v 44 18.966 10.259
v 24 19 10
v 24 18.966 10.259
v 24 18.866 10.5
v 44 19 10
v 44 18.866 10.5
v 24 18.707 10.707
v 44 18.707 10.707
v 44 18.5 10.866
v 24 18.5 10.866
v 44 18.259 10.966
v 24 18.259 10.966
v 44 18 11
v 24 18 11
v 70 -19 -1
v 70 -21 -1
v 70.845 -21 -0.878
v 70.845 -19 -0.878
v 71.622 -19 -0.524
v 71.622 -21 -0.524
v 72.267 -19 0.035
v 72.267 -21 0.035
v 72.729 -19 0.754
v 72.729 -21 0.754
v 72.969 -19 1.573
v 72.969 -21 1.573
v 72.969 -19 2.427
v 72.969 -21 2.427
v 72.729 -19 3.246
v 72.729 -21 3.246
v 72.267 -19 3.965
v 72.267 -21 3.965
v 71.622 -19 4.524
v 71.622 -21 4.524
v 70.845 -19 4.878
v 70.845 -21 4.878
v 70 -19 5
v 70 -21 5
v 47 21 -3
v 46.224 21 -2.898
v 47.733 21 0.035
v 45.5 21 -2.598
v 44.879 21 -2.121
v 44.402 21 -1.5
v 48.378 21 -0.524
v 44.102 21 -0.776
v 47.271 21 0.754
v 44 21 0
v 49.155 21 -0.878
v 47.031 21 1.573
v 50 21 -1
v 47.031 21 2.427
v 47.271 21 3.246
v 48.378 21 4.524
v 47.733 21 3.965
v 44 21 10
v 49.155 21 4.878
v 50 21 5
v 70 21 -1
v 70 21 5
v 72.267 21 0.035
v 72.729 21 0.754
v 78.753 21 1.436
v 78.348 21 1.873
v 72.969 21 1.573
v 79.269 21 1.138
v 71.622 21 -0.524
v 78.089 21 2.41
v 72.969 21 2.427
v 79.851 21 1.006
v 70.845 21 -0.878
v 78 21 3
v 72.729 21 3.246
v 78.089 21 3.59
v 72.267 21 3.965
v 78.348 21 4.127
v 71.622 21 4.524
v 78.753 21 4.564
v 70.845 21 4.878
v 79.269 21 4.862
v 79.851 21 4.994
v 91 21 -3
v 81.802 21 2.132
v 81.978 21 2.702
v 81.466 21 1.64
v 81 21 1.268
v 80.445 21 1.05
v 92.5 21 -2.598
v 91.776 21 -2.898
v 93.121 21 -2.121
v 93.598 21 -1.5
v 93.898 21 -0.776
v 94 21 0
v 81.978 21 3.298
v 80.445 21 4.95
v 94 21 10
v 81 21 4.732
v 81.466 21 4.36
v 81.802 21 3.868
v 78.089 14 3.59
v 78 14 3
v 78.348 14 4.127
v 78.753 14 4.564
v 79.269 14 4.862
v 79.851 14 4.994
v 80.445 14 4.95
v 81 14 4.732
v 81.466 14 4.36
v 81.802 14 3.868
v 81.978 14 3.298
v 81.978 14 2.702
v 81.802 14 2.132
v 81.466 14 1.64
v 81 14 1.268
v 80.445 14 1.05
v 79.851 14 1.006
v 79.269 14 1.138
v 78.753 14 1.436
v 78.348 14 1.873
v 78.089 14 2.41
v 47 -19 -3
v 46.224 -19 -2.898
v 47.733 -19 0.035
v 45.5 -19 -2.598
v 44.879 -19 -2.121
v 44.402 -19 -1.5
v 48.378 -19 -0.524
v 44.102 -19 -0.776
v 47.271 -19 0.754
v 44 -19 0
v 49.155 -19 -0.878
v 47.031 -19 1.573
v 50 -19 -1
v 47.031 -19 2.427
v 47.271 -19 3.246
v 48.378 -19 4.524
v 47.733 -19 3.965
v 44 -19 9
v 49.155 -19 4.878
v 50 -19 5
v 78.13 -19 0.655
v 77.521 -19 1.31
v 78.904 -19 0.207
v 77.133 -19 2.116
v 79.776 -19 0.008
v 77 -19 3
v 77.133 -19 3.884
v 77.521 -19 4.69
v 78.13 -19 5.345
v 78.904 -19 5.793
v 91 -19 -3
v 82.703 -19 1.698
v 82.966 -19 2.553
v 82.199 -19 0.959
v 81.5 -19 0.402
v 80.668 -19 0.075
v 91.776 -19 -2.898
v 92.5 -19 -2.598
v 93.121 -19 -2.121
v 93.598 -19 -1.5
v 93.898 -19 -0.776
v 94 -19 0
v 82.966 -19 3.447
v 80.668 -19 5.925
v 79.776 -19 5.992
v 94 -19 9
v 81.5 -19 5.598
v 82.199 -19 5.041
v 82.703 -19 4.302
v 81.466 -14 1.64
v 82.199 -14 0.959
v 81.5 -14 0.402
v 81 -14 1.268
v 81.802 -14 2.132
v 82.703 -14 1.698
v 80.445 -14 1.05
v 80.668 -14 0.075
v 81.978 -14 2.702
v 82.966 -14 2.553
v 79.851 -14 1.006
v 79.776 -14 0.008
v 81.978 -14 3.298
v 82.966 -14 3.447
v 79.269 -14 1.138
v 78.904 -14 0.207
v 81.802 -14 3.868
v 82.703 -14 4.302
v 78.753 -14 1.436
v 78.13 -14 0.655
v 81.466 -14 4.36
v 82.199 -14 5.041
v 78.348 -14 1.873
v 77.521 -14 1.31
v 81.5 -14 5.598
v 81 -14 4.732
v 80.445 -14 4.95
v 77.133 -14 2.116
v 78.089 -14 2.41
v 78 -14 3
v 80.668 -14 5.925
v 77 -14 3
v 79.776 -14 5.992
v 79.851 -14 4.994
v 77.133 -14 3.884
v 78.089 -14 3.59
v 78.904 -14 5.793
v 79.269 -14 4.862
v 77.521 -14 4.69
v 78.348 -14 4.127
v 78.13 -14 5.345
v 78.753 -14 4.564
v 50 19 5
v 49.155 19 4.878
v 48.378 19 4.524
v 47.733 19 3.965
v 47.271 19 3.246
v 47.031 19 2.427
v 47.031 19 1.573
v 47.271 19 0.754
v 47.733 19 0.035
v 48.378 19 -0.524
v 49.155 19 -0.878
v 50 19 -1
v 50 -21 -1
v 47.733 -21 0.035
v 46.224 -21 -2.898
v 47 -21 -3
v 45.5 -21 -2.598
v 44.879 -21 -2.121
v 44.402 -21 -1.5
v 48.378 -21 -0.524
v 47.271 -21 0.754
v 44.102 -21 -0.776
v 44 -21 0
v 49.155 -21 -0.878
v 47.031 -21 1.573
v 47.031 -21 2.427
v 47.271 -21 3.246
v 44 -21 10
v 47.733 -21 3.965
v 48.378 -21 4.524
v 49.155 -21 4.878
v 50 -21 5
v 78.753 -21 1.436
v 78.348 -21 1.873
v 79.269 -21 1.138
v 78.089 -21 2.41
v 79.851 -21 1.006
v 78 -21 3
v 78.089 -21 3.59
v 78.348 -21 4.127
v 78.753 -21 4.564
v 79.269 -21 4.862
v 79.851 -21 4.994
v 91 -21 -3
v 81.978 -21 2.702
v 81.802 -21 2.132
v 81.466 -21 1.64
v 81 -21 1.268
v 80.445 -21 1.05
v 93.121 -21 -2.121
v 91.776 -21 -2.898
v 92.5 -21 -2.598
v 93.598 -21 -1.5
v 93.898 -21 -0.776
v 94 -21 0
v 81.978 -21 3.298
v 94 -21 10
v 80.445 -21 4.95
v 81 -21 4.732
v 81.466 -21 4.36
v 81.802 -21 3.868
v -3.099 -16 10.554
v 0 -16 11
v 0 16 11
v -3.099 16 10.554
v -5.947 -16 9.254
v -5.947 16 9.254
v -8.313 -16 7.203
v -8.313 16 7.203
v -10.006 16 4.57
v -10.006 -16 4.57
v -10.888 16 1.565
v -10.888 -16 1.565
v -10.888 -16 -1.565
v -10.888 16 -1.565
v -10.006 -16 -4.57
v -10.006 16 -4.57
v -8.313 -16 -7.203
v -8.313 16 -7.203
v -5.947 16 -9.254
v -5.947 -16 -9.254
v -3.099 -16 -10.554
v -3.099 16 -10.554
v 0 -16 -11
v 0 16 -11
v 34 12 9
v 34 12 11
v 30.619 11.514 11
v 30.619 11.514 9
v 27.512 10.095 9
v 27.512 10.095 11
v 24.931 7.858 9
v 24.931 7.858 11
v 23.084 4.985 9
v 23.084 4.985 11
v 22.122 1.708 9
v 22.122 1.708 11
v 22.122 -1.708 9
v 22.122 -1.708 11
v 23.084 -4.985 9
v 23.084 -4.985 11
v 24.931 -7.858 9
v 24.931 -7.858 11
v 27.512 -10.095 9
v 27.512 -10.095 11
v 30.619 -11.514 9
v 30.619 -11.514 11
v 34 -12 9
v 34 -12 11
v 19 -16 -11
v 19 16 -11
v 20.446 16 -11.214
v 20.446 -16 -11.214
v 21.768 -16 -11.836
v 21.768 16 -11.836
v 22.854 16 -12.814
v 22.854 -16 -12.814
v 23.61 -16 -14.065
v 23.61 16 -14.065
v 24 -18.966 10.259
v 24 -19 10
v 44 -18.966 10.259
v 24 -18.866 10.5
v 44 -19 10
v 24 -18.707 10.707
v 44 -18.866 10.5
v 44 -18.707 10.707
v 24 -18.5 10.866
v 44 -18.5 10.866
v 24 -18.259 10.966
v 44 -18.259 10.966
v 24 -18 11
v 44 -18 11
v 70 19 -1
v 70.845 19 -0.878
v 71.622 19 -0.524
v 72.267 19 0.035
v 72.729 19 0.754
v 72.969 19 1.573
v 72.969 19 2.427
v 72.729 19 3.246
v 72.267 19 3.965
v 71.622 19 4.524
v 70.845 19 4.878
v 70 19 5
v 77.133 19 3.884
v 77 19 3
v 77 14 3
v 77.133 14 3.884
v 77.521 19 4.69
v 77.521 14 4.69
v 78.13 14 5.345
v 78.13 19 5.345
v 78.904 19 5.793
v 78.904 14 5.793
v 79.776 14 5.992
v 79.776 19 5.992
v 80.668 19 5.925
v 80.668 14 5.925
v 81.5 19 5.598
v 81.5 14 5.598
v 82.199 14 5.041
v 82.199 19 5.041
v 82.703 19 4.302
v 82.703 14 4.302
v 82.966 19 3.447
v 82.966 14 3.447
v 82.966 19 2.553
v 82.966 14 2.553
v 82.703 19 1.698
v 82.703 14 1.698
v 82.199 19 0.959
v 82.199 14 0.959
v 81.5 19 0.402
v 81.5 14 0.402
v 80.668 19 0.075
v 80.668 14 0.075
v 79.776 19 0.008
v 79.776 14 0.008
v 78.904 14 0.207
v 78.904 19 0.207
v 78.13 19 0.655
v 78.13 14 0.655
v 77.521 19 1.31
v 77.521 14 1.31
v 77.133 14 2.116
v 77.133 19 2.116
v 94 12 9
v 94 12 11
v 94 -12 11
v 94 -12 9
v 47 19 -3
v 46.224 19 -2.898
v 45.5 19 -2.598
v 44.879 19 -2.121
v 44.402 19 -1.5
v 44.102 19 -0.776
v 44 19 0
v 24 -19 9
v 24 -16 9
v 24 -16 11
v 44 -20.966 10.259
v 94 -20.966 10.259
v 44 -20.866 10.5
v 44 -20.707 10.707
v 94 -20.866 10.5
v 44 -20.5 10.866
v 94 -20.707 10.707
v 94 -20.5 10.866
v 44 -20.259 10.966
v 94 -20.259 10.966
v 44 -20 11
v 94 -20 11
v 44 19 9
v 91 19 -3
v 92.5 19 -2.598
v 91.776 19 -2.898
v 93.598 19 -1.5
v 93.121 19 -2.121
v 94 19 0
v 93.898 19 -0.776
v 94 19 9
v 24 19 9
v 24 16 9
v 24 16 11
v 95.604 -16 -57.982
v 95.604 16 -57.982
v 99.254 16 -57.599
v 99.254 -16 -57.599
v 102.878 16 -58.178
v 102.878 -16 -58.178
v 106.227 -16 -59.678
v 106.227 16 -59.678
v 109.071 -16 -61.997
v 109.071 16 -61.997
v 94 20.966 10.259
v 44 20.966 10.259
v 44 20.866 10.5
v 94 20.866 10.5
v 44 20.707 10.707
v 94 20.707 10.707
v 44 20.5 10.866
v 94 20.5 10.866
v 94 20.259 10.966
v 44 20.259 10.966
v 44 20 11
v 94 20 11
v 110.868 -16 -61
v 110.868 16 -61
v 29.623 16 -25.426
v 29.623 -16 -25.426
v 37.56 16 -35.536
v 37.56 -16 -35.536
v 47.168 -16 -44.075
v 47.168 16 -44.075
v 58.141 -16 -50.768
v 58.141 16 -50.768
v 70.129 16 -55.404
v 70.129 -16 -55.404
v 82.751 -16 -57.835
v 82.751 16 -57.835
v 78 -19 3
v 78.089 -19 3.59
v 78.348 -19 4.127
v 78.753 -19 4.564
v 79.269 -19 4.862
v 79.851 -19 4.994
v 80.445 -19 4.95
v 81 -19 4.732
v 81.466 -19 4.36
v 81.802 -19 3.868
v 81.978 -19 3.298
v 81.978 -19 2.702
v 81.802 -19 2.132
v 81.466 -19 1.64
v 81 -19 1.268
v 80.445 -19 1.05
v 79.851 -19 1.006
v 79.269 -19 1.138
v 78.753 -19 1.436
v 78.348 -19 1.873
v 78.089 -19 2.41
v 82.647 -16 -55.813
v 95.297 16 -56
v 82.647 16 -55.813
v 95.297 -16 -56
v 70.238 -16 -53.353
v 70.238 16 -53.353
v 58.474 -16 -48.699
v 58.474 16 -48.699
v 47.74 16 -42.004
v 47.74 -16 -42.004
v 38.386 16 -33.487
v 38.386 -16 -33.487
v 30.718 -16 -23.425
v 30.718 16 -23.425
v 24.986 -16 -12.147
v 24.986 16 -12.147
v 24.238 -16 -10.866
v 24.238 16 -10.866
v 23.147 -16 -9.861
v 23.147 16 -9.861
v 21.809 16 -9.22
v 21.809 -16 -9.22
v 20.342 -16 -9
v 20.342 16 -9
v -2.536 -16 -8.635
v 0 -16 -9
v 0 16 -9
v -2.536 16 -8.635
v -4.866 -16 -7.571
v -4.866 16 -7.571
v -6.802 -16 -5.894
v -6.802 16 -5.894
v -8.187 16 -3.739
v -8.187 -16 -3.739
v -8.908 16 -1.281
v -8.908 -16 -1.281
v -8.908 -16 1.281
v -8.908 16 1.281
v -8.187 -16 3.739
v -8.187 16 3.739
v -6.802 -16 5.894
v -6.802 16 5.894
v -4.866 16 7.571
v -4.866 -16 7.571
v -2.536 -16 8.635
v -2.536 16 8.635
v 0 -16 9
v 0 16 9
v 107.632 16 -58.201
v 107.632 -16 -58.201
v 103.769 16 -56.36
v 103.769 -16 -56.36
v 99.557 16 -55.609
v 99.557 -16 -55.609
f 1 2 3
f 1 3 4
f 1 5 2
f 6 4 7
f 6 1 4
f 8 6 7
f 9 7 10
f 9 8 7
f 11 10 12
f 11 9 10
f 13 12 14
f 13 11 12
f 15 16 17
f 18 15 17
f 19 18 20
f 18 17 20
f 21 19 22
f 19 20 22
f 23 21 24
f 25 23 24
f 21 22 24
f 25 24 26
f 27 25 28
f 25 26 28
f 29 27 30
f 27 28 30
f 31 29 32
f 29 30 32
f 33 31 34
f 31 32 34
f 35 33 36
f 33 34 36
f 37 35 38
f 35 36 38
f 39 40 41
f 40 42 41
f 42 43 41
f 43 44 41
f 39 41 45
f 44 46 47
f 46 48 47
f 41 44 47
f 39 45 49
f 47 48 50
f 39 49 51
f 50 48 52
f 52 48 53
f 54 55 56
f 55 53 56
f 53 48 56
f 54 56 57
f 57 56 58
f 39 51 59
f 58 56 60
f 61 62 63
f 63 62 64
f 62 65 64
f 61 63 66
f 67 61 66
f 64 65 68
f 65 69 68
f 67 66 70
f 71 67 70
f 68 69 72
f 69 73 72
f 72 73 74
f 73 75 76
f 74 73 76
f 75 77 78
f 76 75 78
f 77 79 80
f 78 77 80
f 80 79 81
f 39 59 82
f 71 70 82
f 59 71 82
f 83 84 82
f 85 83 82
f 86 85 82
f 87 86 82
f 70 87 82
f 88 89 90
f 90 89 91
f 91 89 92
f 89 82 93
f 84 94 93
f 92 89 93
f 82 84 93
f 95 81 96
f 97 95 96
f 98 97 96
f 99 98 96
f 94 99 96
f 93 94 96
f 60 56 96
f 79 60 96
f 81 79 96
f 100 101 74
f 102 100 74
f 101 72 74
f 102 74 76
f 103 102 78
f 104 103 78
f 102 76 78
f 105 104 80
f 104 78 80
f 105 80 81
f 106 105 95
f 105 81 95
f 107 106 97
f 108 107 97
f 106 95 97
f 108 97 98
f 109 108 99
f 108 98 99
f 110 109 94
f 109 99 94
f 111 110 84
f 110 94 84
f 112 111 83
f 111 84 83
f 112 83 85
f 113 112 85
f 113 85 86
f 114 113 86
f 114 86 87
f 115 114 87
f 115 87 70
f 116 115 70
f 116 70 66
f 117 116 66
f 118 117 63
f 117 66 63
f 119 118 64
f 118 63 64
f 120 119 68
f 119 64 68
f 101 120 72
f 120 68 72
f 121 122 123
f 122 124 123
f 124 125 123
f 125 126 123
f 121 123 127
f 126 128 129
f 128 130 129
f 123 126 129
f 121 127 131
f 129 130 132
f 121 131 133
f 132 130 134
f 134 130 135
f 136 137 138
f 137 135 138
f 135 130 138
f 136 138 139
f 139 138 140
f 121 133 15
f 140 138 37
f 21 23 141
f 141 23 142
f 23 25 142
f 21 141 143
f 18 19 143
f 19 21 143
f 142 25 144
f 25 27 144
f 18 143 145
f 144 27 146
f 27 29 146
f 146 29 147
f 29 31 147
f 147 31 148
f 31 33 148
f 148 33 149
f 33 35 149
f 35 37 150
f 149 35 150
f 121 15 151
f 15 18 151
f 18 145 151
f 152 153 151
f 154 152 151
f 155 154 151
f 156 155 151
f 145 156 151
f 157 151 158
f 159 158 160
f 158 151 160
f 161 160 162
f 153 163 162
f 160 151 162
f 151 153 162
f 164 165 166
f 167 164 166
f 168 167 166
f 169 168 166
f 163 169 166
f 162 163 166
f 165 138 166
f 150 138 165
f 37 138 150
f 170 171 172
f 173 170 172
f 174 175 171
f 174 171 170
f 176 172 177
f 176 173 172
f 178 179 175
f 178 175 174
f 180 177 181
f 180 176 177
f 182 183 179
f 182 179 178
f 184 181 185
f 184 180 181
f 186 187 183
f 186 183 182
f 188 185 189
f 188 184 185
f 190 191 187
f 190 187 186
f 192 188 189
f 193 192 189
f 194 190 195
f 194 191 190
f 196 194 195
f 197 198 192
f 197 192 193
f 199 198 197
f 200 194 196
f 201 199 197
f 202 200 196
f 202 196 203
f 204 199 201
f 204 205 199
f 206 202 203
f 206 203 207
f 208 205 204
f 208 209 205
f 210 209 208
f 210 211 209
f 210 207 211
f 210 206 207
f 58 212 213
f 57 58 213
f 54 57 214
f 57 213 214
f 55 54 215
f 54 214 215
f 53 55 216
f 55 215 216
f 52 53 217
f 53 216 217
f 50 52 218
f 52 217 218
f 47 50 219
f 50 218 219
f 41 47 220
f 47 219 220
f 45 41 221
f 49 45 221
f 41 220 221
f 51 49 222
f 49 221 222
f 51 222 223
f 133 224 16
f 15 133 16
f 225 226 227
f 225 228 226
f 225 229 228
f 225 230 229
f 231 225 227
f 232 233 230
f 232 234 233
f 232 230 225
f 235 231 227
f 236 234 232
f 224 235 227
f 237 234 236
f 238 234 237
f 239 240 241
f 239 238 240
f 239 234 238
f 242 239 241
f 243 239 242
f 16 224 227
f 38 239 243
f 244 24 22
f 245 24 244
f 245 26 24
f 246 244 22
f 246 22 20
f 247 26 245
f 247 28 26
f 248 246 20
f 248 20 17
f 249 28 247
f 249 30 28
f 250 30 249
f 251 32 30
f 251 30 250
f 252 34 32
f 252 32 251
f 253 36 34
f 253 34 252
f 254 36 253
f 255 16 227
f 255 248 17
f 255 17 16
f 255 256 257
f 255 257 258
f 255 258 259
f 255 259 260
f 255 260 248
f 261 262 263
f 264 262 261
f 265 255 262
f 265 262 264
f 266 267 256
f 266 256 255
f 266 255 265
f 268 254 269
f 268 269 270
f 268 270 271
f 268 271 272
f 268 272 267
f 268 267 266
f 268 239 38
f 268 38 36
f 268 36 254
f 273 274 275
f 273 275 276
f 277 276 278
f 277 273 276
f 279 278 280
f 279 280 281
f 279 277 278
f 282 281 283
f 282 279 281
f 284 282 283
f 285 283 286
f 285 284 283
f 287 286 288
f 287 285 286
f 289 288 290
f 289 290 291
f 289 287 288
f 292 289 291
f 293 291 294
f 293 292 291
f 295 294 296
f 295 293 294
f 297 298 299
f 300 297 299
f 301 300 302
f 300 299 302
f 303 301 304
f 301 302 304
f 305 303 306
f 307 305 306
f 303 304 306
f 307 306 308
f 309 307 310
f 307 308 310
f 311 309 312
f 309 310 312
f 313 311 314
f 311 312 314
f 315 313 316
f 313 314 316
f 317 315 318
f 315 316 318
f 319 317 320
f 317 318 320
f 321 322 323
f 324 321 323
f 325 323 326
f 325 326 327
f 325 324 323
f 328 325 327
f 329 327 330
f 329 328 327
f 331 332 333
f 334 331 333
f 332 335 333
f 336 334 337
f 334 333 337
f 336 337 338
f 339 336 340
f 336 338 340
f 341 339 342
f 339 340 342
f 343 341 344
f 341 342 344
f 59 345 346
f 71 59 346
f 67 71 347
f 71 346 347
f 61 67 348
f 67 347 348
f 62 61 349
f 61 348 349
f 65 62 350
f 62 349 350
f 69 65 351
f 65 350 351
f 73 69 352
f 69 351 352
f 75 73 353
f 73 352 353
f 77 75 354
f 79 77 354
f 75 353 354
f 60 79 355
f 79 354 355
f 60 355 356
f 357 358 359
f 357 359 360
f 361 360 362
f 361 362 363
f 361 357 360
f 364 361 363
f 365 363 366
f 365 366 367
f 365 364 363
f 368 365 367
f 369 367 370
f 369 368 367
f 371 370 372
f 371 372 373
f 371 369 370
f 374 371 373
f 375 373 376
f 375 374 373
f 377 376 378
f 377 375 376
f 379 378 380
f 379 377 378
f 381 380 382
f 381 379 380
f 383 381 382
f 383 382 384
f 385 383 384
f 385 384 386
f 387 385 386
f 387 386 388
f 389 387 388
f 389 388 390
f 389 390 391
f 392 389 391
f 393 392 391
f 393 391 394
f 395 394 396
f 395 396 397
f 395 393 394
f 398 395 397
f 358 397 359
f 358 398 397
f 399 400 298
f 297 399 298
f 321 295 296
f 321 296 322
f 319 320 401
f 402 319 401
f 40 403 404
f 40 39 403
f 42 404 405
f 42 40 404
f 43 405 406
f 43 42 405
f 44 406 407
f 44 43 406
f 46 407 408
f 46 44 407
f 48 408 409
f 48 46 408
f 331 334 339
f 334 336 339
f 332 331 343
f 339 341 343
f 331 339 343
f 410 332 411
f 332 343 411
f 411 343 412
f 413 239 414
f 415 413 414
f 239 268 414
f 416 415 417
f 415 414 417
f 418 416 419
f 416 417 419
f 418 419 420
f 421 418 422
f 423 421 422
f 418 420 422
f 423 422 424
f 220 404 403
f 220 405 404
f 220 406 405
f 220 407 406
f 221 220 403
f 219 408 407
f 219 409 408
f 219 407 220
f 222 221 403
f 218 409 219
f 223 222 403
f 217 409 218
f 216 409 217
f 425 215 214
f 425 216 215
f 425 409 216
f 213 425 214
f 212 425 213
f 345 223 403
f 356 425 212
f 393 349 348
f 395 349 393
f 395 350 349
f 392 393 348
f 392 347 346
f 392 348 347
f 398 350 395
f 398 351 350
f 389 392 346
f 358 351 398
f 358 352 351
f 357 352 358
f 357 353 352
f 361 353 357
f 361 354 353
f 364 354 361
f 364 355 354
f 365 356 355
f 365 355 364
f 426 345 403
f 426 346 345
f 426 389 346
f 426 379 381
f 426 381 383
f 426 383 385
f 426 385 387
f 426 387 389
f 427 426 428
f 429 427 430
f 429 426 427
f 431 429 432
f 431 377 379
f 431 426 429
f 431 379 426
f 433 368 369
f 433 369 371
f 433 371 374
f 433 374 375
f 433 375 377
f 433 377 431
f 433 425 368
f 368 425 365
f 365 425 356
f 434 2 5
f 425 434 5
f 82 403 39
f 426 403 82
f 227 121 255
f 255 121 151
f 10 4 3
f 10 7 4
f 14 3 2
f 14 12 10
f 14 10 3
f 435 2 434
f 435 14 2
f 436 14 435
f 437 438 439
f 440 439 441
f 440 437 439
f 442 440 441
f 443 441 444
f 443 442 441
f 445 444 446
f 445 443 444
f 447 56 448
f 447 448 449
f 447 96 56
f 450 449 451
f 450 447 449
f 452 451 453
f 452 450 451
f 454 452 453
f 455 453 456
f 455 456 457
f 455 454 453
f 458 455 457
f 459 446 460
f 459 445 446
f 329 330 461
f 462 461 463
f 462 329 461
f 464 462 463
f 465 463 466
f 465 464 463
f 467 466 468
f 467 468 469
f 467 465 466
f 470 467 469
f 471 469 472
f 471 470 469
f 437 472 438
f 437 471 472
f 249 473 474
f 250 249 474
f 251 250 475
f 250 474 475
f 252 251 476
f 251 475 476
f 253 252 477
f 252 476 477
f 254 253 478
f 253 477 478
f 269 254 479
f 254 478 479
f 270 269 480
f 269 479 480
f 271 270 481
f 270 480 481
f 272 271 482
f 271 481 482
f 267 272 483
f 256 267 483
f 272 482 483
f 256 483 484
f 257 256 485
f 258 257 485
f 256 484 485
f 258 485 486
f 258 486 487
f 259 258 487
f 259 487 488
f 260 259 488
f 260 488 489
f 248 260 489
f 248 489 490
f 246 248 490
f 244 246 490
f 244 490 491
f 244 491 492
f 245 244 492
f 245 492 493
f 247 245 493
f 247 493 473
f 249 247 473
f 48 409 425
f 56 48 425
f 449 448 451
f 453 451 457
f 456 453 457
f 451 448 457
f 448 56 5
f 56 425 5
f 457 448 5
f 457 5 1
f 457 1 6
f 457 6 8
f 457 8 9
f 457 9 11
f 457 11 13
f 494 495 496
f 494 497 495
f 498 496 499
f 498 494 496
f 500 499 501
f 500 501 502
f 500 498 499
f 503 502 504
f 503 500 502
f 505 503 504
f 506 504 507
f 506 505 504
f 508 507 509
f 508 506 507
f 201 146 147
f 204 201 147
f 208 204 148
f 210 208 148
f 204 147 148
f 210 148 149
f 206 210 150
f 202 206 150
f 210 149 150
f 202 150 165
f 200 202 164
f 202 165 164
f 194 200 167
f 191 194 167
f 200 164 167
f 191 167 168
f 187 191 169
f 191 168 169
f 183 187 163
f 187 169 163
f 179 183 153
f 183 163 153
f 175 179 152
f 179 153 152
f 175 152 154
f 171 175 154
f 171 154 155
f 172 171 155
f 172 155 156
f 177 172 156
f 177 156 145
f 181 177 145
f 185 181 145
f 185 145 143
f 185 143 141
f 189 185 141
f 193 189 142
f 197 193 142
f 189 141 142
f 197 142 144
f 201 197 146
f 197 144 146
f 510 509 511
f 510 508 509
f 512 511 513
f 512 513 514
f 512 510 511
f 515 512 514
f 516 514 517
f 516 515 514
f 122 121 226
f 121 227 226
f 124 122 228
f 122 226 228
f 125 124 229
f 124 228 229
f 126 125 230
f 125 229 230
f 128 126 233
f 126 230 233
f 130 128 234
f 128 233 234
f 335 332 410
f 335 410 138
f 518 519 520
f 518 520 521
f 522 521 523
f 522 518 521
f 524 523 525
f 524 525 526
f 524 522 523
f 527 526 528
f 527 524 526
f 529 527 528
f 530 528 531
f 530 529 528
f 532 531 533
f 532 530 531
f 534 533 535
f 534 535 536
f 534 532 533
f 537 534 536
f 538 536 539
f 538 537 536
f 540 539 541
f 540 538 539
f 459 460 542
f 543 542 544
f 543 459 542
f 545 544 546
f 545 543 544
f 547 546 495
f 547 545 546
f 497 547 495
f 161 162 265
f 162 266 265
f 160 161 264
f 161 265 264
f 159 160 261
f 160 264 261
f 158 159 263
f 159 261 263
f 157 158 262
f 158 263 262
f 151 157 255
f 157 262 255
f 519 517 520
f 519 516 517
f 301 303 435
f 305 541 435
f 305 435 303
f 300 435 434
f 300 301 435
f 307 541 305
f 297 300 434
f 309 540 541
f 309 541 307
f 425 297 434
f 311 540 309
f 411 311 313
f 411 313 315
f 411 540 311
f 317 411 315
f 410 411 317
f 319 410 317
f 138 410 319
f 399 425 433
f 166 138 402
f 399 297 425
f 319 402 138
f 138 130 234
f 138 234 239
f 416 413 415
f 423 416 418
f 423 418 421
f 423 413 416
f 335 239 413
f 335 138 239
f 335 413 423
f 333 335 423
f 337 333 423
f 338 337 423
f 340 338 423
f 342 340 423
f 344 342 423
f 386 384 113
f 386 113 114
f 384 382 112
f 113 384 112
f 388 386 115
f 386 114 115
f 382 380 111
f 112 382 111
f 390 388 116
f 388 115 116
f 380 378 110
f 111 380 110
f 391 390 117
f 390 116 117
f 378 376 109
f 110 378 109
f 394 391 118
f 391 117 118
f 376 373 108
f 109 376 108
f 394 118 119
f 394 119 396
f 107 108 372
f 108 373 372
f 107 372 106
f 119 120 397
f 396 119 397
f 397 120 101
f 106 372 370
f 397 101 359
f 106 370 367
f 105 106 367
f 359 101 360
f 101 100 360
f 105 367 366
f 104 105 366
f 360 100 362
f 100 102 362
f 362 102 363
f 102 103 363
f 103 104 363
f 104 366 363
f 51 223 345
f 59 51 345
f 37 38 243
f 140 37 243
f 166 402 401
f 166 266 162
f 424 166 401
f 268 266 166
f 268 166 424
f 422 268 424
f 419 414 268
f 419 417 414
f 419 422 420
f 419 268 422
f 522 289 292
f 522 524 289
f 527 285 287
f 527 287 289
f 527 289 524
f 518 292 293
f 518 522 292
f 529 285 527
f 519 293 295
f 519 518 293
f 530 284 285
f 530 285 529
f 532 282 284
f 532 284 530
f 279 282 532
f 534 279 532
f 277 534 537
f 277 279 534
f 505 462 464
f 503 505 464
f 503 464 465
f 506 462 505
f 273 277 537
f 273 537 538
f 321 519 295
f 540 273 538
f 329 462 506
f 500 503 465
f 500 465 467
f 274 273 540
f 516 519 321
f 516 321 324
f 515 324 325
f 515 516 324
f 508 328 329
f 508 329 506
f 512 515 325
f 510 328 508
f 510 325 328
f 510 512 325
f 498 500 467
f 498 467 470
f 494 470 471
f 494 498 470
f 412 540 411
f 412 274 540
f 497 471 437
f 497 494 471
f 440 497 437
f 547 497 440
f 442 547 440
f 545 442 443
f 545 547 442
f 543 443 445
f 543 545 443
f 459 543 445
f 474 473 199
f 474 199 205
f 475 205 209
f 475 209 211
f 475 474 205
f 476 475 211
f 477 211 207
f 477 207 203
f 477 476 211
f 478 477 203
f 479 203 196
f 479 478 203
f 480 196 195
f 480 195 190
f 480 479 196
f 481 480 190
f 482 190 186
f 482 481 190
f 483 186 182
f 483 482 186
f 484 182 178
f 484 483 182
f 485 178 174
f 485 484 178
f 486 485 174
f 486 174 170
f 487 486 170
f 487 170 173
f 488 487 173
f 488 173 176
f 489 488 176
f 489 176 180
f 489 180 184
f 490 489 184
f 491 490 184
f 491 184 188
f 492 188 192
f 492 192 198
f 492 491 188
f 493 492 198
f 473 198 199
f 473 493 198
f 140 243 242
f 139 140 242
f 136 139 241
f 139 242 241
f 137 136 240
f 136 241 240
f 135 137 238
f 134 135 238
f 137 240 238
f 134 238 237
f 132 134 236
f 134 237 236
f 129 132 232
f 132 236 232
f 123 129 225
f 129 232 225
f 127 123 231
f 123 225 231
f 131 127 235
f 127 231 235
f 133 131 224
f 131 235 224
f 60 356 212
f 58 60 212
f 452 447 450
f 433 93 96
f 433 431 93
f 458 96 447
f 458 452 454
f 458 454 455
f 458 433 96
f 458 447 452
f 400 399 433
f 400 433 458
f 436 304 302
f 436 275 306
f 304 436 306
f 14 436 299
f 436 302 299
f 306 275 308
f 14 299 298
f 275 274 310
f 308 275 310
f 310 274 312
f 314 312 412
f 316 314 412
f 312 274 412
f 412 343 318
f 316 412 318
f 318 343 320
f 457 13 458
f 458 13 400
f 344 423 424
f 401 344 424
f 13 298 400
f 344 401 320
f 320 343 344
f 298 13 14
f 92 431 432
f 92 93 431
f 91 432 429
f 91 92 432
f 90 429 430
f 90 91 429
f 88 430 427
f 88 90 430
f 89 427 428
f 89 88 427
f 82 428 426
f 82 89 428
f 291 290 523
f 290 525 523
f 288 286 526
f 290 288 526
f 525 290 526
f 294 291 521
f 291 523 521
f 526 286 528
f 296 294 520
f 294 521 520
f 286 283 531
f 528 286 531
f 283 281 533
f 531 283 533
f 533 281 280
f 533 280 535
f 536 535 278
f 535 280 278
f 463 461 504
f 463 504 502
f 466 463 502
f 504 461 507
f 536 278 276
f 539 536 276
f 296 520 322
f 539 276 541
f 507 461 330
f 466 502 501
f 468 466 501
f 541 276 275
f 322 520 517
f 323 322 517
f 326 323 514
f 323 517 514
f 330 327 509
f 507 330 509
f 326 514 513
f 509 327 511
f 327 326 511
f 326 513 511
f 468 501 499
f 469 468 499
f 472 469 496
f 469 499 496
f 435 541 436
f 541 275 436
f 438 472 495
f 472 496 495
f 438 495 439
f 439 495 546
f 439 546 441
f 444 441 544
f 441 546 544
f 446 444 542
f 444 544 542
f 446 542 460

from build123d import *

# Parameters (mm, degrees)
F1_DEPTH  = 16
F2_W      = 70
F2_H      = 3
F3_DEPTH  = 2
F4_W      = 50
F4_H      = 14
F5_DEPTH  = 2
F6_R      = 1
F9_DEPTH  = 2
F11_DEPTH = 42.001
F13_D     = 4
F14_R     = 3
F14_R_2   = 2
F15_DEPTH = 5
F16_R     = 3


# Not quite as in the source:
# - a pattern or mirror of a feature is missing from the dataset's text; its kind, count and spacing are read off the source's solid


with BuildPart() as f1:
    # F0 (on Front) → F1 (new body)
    with BuildSketch(Plane.XZ):
        with BuildLine():
            ThreePointArc((0, -9), (-9, 0), (0, 9))
            Line((0, 9), (94, 9))
            Line((94, 9), (94, 11))
            Line((94, 11), (0, 11))
            ThreePointArc((0, 11), (-11, 0), (0, -11))
            Line((0, -11), (19, -11))
            ThreePointArc((19, -11), (21.7681124643, -11.8361612201), (23.6103896104, -14.064978646))
            ThreePointArc((23.6103896104, -14.064978646), (52.5045279084, -47.666837229), (95.6038093767, -57.9822657286))
            ThreePointArc((95.6038093767, -57.9822657286), (102.8775016632, -58.177663117), (109.0707194958, -61.9971961375))
            Line((109.0707194958, -61.9971961375), (110.8678187413, -61))
            ThreePointArc((110.8678187413, -61), (103.7692922231, -56.3602117831), (95.2965735981, -56))
            ThreePointArc((95.2965735981, -56), (52.955209083, -45.5949761441), (24.9861322889, -12.1467114099))
            ThreePointArc((24.9861322889, -12.1467114099), (23.1470623984, -9.8607704249), (20.3422845953, -9))
            Line((20.3422845953, -9), (0, -9))
        make_face()
    extrude(amount=F1_DEPTH)

    # F2 (on face) → F3 (join)
    with BuildSketch(Plane.XY.offset(11)):
        with Locations((59, -17.5)):
            Rectangle(F2_W, F2_H)
    extrude(amount=-F3_DEPTH)

    # F4 (on face) → F5 (join)
    with BuildSketch(Plane.XZ.offset(19)):
        with Locations((69, 4)):
            Rectangle(F4_W, F4_H)
    extrude(amount=F5_DEPTH)

    # F6
    f6_edges = [f1.edges().sort_by_distance(p)[0] for p in [
        (69, -21, 11),
        (34, -19, 11),
    ]]
    fillet(f6_edges, radius=F6_R)

    # F7: F1 across plane


with BuildPart() as f1_1:
    add(f1.part)
    add(f1.part.mirror(Plane.XZ))

    # F8 (on face) → F9 (cut)
    with BuildSketch(Plane.XY.offset(11)):
        with BuildLine():
            Line((94, 12), (34, 12))
            ThreePointArc((34, 12), (22, 0), (34, -12))
            Line((34, -12), (94, -12))
            Line((94, -12), (94, 12))
        make_face()
    extrude(amount=-F9_DEPTH, mode=Mode.SUBTRACT)

    # F10 (on face) → F11 (cut, through all)
    with BuildSketch(Plane.XZ.offset(21)):
        with BuildLine():
            ThreePointArc((50, 5), (47, 2), (50, -1))
            Line((50, -1), (70, -1))
            ThreePointArc((70, -1), (73, 2), (70, 5))
            Line((70, 5), (50, 5))
        make_face()
    extrude(amount=-F11_DEPTH, mode=Mode.SUBTRACT)

    # F13 (through all)
    with Locations(Plane.XZ.offset(21)):
        with Locations((80, 3)):
            Hole(F13_D / 2)

    # F14 (on face) → F15 (join)
    with BuildSketch(Plane(origin=(0, -19, 0), x_dir=(-1, 0, 0), z_dir=(0, 1, 0))):
        with Locations((-80, 3)):
            Circle(F14_R)
        with Locations((-80, 3)):
            Circle(F14_R_2, mode=Mode.SUBTRACT)
    f15 = extrude(amount=F15_DEPTH)

    # F15_copies: F15 across plane
    add(f15.mirror(Plane.ZX))

    # F16
    f16_edges = [f1_1.edges().sort_by_distance(p)[0] for p in [
        (44, -20, -3),
        (94, -20, -3),
        (94, 20, -3),
        (44, 20, -3),
    ]]
    fillet(f16_edges, radius=F16_R)


solid = f1_1.part
